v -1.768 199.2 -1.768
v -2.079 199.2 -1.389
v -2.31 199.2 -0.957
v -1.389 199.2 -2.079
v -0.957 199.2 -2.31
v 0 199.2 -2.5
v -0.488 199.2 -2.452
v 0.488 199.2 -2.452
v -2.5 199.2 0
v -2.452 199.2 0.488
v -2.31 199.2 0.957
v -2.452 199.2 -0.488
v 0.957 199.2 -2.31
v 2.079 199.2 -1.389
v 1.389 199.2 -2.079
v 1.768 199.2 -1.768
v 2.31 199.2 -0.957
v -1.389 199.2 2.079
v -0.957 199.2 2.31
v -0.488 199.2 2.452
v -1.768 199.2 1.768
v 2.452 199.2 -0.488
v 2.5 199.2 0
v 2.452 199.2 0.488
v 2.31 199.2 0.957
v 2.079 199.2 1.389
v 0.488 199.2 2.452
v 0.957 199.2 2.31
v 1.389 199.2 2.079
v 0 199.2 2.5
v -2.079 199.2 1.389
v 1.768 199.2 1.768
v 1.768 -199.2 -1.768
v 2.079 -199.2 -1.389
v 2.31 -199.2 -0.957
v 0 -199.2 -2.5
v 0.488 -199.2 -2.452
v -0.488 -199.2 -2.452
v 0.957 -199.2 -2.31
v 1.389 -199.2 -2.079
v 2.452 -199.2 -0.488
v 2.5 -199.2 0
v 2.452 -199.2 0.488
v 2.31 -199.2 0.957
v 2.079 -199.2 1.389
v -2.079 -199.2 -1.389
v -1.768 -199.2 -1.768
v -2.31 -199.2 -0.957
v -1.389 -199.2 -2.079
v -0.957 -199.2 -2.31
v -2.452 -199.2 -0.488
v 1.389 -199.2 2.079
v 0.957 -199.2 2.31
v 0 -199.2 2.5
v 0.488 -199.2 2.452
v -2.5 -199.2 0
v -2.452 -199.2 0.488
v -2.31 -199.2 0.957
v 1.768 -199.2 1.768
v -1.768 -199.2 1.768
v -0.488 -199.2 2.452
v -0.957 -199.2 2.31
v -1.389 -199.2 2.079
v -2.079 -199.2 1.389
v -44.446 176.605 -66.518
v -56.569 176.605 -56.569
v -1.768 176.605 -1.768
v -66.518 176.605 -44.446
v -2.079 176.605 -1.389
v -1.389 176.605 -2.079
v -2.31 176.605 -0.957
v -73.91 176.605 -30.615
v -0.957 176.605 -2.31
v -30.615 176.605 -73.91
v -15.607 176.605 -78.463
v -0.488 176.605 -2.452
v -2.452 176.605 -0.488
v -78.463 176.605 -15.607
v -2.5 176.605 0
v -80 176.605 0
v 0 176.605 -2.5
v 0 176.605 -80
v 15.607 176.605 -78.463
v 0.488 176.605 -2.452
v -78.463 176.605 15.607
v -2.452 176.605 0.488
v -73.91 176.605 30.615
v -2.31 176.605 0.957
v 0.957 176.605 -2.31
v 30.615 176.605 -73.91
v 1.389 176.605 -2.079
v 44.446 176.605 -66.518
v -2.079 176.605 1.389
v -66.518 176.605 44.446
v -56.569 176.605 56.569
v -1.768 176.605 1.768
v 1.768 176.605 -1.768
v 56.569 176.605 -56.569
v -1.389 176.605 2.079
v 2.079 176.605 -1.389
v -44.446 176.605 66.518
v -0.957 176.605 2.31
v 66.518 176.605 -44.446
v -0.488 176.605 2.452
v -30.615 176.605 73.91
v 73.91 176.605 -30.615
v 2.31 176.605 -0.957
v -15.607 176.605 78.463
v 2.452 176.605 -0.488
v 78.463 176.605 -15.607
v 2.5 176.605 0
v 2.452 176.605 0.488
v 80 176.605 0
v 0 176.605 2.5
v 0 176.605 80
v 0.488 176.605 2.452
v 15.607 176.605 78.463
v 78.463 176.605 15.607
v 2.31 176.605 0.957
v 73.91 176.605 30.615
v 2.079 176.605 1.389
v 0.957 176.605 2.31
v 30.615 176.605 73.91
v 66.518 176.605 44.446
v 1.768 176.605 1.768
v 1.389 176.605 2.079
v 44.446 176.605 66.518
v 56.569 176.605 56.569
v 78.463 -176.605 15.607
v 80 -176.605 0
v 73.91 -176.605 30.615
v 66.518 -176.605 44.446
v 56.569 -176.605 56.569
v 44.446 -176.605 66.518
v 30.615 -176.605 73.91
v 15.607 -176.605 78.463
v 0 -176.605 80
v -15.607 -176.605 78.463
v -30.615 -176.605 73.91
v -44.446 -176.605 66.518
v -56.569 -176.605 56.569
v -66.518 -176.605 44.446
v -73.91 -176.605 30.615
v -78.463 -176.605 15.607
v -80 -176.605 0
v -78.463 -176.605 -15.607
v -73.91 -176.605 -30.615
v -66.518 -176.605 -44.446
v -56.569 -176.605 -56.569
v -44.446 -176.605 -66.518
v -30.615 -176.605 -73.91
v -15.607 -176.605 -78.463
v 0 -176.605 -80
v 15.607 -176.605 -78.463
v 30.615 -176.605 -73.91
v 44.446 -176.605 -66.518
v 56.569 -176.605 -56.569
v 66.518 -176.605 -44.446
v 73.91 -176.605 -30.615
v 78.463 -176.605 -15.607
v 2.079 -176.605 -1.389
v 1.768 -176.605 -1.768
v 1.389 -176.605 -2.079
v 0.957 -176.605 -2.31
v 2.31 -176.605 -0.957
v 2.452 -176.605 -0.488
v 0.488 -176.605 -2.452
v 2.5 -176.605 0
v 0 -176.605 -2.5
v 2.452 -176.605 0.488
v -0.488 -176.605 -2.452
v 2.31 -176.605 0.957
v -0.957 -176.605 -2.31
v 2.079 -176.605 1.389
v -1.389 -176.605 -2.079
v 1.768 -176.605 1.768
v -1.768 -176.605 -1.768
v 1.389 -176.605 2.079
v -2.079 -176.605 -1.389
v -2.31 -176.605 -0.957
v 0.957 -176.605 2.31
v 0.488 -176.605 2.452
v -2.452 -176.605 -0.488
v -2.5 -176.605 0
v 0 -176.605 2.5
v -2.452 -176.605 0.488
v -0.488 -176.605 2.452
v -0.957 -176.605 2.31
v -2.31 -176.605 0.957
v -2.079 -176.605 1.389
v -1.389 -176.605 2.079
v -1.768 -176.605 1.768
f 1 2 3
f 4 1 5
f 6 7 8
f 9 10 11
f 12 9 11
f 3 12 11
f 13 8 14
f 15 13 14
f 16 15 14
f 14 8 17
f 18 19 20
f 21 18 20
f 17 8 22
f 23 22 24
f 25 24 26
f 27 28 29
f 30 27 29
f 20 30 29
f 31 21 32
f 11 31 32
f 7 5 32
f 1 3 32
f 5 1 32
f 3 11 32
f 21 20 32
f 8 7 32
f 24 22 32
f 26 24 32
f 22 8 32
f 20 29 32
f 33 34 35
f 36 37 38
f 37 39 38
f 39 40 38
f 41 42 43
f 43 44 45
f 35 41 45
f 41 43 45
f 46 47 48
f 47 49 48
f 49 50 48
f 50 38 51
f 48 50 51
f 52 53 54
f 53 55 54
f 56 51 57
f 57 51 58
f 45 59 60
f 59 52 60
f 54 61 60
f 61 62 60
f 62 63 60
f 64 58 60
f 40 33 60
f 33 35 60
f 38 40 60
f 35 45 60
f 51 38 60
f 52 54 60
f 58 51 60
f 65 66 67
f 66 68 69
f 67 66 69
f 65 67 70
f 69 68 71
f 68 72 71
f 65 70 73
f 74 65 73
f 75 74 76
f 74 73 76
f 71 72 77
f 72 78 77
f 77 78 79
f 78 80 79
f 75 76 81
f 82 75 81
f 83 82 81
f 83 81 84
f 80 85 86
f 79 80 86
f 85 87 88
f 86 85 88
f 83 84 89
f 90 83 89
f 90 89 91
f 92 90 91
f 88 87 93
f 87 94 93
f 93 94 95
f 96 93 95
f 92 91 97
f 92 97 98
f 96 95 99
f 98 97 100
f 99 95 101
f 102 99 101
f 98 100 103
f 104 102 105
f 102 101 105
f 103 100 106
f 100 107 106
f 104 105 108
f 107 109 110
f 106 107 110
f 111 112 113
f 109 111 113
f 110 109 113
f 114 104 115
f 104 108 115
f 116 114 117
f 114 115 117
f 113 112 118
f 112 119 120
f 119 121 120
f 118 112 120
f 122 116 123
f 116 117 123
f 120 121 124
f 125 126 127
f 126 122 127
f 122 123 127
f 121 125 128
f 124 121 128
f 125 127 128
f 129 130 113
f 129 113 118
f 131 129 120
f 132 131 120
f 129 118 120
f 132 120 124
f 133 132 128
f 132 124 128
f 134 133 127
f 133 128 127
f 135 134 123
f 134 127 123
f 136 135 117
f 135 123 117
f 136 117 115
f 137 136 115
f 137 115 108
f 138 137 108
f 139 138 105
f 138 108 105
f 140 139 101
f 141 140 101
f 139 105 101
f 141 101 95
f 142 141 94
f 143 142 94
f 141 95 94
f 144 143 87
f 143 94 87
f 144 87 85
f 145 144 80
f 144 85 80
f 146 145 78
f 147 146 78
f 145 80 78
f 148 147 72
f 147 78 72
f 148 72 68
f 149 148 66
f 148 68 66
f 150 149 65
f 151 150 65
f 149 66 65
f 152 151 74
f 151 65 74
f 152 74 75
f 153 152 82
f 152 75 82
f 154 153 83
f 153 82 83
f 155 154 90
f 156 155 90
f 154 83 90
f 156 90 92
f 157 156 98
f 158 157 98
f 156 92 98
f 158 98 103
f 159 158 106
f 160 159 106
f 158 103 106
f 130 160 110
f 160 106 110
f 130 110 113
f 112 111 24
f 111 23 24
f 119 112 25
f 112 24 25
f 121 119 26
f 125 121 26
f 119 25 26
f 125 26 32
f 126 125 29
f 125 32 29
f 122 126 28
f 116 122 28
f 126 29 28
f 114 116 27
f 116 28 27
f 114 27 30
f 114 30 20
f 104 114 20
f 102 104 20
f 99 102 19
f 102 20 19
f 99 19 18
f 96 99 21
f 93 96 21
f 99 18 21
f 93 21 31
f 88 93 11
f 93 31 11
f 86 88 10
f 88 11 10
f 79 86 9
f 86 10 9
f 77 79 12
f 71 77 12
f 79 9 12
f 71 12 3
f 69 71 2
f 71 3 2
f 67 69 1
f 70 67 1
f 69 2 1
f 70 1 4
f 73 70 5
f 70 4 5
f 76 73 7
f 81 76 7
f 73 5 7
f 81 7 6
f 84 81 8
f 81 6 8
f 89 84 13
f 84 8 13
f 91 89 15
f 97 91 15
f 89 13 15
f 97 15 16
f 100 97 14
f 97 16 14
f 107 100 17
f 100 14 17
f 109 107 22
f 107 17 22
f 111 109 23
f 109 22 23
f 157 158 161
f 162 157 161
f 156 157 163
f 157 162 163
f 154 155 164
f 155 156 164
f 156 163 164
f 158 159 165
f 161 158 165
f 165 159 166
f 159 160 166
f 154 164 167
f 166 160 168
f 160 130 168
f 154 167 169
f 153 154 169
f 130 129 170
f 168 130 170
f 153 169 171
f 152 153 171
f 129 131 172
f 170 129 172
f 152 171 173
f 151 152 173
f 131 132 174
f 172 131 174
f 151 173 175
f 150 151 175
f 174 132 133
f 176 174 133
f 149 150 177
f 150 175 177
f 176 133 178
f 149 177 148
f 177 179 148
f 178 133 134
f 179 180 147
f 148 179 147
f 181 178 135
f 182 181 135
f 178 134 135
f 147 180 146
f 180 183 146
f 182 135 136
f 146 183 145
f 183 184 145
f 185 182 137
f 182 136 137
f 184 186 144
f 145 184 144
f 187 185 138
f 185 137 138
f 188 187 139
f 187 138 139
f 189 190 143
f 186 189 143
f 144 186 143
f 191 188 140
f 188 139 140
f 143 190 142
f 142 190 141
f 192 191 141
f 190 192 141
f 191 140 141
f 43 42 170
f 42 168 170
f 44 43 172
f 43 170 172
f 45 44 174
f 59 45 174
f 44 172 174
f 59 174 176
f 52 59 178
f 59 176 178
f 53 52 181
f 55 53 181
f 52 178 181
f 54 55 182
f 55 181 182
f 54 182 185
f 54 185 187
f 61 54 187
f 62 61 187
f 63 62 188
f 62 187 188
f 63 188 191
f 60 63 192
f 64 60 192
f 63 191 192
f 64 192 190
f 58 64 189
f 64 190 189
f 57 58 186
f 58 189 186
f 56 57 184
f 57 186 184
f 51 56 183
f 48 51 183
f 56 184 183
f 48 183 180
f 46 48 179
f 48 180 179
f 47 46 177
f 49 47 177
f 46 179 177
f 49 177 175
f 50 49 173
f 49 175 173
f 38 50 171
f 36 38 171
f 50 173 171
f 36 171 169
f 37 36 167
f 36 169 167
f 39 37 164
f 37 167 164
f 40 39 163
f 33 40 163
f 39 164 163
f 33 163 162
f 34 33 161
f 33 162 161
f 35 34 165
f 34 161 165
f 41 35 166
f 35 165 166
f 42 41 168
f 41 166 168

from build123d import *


with BuildPart() as part:
    # Croquis1 → Revolución1 (revolve)
    with BuildSketch(Plane.XY):
        Polygon((2.5, 199.2), (0, 199.2), (0, 0), (80, 0), (80, 176.605), (2.5, 176.605), align=None)
        Polygon((80, 0), (0, 0), (0, -199.2), (2.5, -199.2), (2.5, -176.605), (80, -176.605), align=None)
    revolve(axis=Axis((0, 415.25313391, 0), (0, -1, 0)))


solid = part.part
